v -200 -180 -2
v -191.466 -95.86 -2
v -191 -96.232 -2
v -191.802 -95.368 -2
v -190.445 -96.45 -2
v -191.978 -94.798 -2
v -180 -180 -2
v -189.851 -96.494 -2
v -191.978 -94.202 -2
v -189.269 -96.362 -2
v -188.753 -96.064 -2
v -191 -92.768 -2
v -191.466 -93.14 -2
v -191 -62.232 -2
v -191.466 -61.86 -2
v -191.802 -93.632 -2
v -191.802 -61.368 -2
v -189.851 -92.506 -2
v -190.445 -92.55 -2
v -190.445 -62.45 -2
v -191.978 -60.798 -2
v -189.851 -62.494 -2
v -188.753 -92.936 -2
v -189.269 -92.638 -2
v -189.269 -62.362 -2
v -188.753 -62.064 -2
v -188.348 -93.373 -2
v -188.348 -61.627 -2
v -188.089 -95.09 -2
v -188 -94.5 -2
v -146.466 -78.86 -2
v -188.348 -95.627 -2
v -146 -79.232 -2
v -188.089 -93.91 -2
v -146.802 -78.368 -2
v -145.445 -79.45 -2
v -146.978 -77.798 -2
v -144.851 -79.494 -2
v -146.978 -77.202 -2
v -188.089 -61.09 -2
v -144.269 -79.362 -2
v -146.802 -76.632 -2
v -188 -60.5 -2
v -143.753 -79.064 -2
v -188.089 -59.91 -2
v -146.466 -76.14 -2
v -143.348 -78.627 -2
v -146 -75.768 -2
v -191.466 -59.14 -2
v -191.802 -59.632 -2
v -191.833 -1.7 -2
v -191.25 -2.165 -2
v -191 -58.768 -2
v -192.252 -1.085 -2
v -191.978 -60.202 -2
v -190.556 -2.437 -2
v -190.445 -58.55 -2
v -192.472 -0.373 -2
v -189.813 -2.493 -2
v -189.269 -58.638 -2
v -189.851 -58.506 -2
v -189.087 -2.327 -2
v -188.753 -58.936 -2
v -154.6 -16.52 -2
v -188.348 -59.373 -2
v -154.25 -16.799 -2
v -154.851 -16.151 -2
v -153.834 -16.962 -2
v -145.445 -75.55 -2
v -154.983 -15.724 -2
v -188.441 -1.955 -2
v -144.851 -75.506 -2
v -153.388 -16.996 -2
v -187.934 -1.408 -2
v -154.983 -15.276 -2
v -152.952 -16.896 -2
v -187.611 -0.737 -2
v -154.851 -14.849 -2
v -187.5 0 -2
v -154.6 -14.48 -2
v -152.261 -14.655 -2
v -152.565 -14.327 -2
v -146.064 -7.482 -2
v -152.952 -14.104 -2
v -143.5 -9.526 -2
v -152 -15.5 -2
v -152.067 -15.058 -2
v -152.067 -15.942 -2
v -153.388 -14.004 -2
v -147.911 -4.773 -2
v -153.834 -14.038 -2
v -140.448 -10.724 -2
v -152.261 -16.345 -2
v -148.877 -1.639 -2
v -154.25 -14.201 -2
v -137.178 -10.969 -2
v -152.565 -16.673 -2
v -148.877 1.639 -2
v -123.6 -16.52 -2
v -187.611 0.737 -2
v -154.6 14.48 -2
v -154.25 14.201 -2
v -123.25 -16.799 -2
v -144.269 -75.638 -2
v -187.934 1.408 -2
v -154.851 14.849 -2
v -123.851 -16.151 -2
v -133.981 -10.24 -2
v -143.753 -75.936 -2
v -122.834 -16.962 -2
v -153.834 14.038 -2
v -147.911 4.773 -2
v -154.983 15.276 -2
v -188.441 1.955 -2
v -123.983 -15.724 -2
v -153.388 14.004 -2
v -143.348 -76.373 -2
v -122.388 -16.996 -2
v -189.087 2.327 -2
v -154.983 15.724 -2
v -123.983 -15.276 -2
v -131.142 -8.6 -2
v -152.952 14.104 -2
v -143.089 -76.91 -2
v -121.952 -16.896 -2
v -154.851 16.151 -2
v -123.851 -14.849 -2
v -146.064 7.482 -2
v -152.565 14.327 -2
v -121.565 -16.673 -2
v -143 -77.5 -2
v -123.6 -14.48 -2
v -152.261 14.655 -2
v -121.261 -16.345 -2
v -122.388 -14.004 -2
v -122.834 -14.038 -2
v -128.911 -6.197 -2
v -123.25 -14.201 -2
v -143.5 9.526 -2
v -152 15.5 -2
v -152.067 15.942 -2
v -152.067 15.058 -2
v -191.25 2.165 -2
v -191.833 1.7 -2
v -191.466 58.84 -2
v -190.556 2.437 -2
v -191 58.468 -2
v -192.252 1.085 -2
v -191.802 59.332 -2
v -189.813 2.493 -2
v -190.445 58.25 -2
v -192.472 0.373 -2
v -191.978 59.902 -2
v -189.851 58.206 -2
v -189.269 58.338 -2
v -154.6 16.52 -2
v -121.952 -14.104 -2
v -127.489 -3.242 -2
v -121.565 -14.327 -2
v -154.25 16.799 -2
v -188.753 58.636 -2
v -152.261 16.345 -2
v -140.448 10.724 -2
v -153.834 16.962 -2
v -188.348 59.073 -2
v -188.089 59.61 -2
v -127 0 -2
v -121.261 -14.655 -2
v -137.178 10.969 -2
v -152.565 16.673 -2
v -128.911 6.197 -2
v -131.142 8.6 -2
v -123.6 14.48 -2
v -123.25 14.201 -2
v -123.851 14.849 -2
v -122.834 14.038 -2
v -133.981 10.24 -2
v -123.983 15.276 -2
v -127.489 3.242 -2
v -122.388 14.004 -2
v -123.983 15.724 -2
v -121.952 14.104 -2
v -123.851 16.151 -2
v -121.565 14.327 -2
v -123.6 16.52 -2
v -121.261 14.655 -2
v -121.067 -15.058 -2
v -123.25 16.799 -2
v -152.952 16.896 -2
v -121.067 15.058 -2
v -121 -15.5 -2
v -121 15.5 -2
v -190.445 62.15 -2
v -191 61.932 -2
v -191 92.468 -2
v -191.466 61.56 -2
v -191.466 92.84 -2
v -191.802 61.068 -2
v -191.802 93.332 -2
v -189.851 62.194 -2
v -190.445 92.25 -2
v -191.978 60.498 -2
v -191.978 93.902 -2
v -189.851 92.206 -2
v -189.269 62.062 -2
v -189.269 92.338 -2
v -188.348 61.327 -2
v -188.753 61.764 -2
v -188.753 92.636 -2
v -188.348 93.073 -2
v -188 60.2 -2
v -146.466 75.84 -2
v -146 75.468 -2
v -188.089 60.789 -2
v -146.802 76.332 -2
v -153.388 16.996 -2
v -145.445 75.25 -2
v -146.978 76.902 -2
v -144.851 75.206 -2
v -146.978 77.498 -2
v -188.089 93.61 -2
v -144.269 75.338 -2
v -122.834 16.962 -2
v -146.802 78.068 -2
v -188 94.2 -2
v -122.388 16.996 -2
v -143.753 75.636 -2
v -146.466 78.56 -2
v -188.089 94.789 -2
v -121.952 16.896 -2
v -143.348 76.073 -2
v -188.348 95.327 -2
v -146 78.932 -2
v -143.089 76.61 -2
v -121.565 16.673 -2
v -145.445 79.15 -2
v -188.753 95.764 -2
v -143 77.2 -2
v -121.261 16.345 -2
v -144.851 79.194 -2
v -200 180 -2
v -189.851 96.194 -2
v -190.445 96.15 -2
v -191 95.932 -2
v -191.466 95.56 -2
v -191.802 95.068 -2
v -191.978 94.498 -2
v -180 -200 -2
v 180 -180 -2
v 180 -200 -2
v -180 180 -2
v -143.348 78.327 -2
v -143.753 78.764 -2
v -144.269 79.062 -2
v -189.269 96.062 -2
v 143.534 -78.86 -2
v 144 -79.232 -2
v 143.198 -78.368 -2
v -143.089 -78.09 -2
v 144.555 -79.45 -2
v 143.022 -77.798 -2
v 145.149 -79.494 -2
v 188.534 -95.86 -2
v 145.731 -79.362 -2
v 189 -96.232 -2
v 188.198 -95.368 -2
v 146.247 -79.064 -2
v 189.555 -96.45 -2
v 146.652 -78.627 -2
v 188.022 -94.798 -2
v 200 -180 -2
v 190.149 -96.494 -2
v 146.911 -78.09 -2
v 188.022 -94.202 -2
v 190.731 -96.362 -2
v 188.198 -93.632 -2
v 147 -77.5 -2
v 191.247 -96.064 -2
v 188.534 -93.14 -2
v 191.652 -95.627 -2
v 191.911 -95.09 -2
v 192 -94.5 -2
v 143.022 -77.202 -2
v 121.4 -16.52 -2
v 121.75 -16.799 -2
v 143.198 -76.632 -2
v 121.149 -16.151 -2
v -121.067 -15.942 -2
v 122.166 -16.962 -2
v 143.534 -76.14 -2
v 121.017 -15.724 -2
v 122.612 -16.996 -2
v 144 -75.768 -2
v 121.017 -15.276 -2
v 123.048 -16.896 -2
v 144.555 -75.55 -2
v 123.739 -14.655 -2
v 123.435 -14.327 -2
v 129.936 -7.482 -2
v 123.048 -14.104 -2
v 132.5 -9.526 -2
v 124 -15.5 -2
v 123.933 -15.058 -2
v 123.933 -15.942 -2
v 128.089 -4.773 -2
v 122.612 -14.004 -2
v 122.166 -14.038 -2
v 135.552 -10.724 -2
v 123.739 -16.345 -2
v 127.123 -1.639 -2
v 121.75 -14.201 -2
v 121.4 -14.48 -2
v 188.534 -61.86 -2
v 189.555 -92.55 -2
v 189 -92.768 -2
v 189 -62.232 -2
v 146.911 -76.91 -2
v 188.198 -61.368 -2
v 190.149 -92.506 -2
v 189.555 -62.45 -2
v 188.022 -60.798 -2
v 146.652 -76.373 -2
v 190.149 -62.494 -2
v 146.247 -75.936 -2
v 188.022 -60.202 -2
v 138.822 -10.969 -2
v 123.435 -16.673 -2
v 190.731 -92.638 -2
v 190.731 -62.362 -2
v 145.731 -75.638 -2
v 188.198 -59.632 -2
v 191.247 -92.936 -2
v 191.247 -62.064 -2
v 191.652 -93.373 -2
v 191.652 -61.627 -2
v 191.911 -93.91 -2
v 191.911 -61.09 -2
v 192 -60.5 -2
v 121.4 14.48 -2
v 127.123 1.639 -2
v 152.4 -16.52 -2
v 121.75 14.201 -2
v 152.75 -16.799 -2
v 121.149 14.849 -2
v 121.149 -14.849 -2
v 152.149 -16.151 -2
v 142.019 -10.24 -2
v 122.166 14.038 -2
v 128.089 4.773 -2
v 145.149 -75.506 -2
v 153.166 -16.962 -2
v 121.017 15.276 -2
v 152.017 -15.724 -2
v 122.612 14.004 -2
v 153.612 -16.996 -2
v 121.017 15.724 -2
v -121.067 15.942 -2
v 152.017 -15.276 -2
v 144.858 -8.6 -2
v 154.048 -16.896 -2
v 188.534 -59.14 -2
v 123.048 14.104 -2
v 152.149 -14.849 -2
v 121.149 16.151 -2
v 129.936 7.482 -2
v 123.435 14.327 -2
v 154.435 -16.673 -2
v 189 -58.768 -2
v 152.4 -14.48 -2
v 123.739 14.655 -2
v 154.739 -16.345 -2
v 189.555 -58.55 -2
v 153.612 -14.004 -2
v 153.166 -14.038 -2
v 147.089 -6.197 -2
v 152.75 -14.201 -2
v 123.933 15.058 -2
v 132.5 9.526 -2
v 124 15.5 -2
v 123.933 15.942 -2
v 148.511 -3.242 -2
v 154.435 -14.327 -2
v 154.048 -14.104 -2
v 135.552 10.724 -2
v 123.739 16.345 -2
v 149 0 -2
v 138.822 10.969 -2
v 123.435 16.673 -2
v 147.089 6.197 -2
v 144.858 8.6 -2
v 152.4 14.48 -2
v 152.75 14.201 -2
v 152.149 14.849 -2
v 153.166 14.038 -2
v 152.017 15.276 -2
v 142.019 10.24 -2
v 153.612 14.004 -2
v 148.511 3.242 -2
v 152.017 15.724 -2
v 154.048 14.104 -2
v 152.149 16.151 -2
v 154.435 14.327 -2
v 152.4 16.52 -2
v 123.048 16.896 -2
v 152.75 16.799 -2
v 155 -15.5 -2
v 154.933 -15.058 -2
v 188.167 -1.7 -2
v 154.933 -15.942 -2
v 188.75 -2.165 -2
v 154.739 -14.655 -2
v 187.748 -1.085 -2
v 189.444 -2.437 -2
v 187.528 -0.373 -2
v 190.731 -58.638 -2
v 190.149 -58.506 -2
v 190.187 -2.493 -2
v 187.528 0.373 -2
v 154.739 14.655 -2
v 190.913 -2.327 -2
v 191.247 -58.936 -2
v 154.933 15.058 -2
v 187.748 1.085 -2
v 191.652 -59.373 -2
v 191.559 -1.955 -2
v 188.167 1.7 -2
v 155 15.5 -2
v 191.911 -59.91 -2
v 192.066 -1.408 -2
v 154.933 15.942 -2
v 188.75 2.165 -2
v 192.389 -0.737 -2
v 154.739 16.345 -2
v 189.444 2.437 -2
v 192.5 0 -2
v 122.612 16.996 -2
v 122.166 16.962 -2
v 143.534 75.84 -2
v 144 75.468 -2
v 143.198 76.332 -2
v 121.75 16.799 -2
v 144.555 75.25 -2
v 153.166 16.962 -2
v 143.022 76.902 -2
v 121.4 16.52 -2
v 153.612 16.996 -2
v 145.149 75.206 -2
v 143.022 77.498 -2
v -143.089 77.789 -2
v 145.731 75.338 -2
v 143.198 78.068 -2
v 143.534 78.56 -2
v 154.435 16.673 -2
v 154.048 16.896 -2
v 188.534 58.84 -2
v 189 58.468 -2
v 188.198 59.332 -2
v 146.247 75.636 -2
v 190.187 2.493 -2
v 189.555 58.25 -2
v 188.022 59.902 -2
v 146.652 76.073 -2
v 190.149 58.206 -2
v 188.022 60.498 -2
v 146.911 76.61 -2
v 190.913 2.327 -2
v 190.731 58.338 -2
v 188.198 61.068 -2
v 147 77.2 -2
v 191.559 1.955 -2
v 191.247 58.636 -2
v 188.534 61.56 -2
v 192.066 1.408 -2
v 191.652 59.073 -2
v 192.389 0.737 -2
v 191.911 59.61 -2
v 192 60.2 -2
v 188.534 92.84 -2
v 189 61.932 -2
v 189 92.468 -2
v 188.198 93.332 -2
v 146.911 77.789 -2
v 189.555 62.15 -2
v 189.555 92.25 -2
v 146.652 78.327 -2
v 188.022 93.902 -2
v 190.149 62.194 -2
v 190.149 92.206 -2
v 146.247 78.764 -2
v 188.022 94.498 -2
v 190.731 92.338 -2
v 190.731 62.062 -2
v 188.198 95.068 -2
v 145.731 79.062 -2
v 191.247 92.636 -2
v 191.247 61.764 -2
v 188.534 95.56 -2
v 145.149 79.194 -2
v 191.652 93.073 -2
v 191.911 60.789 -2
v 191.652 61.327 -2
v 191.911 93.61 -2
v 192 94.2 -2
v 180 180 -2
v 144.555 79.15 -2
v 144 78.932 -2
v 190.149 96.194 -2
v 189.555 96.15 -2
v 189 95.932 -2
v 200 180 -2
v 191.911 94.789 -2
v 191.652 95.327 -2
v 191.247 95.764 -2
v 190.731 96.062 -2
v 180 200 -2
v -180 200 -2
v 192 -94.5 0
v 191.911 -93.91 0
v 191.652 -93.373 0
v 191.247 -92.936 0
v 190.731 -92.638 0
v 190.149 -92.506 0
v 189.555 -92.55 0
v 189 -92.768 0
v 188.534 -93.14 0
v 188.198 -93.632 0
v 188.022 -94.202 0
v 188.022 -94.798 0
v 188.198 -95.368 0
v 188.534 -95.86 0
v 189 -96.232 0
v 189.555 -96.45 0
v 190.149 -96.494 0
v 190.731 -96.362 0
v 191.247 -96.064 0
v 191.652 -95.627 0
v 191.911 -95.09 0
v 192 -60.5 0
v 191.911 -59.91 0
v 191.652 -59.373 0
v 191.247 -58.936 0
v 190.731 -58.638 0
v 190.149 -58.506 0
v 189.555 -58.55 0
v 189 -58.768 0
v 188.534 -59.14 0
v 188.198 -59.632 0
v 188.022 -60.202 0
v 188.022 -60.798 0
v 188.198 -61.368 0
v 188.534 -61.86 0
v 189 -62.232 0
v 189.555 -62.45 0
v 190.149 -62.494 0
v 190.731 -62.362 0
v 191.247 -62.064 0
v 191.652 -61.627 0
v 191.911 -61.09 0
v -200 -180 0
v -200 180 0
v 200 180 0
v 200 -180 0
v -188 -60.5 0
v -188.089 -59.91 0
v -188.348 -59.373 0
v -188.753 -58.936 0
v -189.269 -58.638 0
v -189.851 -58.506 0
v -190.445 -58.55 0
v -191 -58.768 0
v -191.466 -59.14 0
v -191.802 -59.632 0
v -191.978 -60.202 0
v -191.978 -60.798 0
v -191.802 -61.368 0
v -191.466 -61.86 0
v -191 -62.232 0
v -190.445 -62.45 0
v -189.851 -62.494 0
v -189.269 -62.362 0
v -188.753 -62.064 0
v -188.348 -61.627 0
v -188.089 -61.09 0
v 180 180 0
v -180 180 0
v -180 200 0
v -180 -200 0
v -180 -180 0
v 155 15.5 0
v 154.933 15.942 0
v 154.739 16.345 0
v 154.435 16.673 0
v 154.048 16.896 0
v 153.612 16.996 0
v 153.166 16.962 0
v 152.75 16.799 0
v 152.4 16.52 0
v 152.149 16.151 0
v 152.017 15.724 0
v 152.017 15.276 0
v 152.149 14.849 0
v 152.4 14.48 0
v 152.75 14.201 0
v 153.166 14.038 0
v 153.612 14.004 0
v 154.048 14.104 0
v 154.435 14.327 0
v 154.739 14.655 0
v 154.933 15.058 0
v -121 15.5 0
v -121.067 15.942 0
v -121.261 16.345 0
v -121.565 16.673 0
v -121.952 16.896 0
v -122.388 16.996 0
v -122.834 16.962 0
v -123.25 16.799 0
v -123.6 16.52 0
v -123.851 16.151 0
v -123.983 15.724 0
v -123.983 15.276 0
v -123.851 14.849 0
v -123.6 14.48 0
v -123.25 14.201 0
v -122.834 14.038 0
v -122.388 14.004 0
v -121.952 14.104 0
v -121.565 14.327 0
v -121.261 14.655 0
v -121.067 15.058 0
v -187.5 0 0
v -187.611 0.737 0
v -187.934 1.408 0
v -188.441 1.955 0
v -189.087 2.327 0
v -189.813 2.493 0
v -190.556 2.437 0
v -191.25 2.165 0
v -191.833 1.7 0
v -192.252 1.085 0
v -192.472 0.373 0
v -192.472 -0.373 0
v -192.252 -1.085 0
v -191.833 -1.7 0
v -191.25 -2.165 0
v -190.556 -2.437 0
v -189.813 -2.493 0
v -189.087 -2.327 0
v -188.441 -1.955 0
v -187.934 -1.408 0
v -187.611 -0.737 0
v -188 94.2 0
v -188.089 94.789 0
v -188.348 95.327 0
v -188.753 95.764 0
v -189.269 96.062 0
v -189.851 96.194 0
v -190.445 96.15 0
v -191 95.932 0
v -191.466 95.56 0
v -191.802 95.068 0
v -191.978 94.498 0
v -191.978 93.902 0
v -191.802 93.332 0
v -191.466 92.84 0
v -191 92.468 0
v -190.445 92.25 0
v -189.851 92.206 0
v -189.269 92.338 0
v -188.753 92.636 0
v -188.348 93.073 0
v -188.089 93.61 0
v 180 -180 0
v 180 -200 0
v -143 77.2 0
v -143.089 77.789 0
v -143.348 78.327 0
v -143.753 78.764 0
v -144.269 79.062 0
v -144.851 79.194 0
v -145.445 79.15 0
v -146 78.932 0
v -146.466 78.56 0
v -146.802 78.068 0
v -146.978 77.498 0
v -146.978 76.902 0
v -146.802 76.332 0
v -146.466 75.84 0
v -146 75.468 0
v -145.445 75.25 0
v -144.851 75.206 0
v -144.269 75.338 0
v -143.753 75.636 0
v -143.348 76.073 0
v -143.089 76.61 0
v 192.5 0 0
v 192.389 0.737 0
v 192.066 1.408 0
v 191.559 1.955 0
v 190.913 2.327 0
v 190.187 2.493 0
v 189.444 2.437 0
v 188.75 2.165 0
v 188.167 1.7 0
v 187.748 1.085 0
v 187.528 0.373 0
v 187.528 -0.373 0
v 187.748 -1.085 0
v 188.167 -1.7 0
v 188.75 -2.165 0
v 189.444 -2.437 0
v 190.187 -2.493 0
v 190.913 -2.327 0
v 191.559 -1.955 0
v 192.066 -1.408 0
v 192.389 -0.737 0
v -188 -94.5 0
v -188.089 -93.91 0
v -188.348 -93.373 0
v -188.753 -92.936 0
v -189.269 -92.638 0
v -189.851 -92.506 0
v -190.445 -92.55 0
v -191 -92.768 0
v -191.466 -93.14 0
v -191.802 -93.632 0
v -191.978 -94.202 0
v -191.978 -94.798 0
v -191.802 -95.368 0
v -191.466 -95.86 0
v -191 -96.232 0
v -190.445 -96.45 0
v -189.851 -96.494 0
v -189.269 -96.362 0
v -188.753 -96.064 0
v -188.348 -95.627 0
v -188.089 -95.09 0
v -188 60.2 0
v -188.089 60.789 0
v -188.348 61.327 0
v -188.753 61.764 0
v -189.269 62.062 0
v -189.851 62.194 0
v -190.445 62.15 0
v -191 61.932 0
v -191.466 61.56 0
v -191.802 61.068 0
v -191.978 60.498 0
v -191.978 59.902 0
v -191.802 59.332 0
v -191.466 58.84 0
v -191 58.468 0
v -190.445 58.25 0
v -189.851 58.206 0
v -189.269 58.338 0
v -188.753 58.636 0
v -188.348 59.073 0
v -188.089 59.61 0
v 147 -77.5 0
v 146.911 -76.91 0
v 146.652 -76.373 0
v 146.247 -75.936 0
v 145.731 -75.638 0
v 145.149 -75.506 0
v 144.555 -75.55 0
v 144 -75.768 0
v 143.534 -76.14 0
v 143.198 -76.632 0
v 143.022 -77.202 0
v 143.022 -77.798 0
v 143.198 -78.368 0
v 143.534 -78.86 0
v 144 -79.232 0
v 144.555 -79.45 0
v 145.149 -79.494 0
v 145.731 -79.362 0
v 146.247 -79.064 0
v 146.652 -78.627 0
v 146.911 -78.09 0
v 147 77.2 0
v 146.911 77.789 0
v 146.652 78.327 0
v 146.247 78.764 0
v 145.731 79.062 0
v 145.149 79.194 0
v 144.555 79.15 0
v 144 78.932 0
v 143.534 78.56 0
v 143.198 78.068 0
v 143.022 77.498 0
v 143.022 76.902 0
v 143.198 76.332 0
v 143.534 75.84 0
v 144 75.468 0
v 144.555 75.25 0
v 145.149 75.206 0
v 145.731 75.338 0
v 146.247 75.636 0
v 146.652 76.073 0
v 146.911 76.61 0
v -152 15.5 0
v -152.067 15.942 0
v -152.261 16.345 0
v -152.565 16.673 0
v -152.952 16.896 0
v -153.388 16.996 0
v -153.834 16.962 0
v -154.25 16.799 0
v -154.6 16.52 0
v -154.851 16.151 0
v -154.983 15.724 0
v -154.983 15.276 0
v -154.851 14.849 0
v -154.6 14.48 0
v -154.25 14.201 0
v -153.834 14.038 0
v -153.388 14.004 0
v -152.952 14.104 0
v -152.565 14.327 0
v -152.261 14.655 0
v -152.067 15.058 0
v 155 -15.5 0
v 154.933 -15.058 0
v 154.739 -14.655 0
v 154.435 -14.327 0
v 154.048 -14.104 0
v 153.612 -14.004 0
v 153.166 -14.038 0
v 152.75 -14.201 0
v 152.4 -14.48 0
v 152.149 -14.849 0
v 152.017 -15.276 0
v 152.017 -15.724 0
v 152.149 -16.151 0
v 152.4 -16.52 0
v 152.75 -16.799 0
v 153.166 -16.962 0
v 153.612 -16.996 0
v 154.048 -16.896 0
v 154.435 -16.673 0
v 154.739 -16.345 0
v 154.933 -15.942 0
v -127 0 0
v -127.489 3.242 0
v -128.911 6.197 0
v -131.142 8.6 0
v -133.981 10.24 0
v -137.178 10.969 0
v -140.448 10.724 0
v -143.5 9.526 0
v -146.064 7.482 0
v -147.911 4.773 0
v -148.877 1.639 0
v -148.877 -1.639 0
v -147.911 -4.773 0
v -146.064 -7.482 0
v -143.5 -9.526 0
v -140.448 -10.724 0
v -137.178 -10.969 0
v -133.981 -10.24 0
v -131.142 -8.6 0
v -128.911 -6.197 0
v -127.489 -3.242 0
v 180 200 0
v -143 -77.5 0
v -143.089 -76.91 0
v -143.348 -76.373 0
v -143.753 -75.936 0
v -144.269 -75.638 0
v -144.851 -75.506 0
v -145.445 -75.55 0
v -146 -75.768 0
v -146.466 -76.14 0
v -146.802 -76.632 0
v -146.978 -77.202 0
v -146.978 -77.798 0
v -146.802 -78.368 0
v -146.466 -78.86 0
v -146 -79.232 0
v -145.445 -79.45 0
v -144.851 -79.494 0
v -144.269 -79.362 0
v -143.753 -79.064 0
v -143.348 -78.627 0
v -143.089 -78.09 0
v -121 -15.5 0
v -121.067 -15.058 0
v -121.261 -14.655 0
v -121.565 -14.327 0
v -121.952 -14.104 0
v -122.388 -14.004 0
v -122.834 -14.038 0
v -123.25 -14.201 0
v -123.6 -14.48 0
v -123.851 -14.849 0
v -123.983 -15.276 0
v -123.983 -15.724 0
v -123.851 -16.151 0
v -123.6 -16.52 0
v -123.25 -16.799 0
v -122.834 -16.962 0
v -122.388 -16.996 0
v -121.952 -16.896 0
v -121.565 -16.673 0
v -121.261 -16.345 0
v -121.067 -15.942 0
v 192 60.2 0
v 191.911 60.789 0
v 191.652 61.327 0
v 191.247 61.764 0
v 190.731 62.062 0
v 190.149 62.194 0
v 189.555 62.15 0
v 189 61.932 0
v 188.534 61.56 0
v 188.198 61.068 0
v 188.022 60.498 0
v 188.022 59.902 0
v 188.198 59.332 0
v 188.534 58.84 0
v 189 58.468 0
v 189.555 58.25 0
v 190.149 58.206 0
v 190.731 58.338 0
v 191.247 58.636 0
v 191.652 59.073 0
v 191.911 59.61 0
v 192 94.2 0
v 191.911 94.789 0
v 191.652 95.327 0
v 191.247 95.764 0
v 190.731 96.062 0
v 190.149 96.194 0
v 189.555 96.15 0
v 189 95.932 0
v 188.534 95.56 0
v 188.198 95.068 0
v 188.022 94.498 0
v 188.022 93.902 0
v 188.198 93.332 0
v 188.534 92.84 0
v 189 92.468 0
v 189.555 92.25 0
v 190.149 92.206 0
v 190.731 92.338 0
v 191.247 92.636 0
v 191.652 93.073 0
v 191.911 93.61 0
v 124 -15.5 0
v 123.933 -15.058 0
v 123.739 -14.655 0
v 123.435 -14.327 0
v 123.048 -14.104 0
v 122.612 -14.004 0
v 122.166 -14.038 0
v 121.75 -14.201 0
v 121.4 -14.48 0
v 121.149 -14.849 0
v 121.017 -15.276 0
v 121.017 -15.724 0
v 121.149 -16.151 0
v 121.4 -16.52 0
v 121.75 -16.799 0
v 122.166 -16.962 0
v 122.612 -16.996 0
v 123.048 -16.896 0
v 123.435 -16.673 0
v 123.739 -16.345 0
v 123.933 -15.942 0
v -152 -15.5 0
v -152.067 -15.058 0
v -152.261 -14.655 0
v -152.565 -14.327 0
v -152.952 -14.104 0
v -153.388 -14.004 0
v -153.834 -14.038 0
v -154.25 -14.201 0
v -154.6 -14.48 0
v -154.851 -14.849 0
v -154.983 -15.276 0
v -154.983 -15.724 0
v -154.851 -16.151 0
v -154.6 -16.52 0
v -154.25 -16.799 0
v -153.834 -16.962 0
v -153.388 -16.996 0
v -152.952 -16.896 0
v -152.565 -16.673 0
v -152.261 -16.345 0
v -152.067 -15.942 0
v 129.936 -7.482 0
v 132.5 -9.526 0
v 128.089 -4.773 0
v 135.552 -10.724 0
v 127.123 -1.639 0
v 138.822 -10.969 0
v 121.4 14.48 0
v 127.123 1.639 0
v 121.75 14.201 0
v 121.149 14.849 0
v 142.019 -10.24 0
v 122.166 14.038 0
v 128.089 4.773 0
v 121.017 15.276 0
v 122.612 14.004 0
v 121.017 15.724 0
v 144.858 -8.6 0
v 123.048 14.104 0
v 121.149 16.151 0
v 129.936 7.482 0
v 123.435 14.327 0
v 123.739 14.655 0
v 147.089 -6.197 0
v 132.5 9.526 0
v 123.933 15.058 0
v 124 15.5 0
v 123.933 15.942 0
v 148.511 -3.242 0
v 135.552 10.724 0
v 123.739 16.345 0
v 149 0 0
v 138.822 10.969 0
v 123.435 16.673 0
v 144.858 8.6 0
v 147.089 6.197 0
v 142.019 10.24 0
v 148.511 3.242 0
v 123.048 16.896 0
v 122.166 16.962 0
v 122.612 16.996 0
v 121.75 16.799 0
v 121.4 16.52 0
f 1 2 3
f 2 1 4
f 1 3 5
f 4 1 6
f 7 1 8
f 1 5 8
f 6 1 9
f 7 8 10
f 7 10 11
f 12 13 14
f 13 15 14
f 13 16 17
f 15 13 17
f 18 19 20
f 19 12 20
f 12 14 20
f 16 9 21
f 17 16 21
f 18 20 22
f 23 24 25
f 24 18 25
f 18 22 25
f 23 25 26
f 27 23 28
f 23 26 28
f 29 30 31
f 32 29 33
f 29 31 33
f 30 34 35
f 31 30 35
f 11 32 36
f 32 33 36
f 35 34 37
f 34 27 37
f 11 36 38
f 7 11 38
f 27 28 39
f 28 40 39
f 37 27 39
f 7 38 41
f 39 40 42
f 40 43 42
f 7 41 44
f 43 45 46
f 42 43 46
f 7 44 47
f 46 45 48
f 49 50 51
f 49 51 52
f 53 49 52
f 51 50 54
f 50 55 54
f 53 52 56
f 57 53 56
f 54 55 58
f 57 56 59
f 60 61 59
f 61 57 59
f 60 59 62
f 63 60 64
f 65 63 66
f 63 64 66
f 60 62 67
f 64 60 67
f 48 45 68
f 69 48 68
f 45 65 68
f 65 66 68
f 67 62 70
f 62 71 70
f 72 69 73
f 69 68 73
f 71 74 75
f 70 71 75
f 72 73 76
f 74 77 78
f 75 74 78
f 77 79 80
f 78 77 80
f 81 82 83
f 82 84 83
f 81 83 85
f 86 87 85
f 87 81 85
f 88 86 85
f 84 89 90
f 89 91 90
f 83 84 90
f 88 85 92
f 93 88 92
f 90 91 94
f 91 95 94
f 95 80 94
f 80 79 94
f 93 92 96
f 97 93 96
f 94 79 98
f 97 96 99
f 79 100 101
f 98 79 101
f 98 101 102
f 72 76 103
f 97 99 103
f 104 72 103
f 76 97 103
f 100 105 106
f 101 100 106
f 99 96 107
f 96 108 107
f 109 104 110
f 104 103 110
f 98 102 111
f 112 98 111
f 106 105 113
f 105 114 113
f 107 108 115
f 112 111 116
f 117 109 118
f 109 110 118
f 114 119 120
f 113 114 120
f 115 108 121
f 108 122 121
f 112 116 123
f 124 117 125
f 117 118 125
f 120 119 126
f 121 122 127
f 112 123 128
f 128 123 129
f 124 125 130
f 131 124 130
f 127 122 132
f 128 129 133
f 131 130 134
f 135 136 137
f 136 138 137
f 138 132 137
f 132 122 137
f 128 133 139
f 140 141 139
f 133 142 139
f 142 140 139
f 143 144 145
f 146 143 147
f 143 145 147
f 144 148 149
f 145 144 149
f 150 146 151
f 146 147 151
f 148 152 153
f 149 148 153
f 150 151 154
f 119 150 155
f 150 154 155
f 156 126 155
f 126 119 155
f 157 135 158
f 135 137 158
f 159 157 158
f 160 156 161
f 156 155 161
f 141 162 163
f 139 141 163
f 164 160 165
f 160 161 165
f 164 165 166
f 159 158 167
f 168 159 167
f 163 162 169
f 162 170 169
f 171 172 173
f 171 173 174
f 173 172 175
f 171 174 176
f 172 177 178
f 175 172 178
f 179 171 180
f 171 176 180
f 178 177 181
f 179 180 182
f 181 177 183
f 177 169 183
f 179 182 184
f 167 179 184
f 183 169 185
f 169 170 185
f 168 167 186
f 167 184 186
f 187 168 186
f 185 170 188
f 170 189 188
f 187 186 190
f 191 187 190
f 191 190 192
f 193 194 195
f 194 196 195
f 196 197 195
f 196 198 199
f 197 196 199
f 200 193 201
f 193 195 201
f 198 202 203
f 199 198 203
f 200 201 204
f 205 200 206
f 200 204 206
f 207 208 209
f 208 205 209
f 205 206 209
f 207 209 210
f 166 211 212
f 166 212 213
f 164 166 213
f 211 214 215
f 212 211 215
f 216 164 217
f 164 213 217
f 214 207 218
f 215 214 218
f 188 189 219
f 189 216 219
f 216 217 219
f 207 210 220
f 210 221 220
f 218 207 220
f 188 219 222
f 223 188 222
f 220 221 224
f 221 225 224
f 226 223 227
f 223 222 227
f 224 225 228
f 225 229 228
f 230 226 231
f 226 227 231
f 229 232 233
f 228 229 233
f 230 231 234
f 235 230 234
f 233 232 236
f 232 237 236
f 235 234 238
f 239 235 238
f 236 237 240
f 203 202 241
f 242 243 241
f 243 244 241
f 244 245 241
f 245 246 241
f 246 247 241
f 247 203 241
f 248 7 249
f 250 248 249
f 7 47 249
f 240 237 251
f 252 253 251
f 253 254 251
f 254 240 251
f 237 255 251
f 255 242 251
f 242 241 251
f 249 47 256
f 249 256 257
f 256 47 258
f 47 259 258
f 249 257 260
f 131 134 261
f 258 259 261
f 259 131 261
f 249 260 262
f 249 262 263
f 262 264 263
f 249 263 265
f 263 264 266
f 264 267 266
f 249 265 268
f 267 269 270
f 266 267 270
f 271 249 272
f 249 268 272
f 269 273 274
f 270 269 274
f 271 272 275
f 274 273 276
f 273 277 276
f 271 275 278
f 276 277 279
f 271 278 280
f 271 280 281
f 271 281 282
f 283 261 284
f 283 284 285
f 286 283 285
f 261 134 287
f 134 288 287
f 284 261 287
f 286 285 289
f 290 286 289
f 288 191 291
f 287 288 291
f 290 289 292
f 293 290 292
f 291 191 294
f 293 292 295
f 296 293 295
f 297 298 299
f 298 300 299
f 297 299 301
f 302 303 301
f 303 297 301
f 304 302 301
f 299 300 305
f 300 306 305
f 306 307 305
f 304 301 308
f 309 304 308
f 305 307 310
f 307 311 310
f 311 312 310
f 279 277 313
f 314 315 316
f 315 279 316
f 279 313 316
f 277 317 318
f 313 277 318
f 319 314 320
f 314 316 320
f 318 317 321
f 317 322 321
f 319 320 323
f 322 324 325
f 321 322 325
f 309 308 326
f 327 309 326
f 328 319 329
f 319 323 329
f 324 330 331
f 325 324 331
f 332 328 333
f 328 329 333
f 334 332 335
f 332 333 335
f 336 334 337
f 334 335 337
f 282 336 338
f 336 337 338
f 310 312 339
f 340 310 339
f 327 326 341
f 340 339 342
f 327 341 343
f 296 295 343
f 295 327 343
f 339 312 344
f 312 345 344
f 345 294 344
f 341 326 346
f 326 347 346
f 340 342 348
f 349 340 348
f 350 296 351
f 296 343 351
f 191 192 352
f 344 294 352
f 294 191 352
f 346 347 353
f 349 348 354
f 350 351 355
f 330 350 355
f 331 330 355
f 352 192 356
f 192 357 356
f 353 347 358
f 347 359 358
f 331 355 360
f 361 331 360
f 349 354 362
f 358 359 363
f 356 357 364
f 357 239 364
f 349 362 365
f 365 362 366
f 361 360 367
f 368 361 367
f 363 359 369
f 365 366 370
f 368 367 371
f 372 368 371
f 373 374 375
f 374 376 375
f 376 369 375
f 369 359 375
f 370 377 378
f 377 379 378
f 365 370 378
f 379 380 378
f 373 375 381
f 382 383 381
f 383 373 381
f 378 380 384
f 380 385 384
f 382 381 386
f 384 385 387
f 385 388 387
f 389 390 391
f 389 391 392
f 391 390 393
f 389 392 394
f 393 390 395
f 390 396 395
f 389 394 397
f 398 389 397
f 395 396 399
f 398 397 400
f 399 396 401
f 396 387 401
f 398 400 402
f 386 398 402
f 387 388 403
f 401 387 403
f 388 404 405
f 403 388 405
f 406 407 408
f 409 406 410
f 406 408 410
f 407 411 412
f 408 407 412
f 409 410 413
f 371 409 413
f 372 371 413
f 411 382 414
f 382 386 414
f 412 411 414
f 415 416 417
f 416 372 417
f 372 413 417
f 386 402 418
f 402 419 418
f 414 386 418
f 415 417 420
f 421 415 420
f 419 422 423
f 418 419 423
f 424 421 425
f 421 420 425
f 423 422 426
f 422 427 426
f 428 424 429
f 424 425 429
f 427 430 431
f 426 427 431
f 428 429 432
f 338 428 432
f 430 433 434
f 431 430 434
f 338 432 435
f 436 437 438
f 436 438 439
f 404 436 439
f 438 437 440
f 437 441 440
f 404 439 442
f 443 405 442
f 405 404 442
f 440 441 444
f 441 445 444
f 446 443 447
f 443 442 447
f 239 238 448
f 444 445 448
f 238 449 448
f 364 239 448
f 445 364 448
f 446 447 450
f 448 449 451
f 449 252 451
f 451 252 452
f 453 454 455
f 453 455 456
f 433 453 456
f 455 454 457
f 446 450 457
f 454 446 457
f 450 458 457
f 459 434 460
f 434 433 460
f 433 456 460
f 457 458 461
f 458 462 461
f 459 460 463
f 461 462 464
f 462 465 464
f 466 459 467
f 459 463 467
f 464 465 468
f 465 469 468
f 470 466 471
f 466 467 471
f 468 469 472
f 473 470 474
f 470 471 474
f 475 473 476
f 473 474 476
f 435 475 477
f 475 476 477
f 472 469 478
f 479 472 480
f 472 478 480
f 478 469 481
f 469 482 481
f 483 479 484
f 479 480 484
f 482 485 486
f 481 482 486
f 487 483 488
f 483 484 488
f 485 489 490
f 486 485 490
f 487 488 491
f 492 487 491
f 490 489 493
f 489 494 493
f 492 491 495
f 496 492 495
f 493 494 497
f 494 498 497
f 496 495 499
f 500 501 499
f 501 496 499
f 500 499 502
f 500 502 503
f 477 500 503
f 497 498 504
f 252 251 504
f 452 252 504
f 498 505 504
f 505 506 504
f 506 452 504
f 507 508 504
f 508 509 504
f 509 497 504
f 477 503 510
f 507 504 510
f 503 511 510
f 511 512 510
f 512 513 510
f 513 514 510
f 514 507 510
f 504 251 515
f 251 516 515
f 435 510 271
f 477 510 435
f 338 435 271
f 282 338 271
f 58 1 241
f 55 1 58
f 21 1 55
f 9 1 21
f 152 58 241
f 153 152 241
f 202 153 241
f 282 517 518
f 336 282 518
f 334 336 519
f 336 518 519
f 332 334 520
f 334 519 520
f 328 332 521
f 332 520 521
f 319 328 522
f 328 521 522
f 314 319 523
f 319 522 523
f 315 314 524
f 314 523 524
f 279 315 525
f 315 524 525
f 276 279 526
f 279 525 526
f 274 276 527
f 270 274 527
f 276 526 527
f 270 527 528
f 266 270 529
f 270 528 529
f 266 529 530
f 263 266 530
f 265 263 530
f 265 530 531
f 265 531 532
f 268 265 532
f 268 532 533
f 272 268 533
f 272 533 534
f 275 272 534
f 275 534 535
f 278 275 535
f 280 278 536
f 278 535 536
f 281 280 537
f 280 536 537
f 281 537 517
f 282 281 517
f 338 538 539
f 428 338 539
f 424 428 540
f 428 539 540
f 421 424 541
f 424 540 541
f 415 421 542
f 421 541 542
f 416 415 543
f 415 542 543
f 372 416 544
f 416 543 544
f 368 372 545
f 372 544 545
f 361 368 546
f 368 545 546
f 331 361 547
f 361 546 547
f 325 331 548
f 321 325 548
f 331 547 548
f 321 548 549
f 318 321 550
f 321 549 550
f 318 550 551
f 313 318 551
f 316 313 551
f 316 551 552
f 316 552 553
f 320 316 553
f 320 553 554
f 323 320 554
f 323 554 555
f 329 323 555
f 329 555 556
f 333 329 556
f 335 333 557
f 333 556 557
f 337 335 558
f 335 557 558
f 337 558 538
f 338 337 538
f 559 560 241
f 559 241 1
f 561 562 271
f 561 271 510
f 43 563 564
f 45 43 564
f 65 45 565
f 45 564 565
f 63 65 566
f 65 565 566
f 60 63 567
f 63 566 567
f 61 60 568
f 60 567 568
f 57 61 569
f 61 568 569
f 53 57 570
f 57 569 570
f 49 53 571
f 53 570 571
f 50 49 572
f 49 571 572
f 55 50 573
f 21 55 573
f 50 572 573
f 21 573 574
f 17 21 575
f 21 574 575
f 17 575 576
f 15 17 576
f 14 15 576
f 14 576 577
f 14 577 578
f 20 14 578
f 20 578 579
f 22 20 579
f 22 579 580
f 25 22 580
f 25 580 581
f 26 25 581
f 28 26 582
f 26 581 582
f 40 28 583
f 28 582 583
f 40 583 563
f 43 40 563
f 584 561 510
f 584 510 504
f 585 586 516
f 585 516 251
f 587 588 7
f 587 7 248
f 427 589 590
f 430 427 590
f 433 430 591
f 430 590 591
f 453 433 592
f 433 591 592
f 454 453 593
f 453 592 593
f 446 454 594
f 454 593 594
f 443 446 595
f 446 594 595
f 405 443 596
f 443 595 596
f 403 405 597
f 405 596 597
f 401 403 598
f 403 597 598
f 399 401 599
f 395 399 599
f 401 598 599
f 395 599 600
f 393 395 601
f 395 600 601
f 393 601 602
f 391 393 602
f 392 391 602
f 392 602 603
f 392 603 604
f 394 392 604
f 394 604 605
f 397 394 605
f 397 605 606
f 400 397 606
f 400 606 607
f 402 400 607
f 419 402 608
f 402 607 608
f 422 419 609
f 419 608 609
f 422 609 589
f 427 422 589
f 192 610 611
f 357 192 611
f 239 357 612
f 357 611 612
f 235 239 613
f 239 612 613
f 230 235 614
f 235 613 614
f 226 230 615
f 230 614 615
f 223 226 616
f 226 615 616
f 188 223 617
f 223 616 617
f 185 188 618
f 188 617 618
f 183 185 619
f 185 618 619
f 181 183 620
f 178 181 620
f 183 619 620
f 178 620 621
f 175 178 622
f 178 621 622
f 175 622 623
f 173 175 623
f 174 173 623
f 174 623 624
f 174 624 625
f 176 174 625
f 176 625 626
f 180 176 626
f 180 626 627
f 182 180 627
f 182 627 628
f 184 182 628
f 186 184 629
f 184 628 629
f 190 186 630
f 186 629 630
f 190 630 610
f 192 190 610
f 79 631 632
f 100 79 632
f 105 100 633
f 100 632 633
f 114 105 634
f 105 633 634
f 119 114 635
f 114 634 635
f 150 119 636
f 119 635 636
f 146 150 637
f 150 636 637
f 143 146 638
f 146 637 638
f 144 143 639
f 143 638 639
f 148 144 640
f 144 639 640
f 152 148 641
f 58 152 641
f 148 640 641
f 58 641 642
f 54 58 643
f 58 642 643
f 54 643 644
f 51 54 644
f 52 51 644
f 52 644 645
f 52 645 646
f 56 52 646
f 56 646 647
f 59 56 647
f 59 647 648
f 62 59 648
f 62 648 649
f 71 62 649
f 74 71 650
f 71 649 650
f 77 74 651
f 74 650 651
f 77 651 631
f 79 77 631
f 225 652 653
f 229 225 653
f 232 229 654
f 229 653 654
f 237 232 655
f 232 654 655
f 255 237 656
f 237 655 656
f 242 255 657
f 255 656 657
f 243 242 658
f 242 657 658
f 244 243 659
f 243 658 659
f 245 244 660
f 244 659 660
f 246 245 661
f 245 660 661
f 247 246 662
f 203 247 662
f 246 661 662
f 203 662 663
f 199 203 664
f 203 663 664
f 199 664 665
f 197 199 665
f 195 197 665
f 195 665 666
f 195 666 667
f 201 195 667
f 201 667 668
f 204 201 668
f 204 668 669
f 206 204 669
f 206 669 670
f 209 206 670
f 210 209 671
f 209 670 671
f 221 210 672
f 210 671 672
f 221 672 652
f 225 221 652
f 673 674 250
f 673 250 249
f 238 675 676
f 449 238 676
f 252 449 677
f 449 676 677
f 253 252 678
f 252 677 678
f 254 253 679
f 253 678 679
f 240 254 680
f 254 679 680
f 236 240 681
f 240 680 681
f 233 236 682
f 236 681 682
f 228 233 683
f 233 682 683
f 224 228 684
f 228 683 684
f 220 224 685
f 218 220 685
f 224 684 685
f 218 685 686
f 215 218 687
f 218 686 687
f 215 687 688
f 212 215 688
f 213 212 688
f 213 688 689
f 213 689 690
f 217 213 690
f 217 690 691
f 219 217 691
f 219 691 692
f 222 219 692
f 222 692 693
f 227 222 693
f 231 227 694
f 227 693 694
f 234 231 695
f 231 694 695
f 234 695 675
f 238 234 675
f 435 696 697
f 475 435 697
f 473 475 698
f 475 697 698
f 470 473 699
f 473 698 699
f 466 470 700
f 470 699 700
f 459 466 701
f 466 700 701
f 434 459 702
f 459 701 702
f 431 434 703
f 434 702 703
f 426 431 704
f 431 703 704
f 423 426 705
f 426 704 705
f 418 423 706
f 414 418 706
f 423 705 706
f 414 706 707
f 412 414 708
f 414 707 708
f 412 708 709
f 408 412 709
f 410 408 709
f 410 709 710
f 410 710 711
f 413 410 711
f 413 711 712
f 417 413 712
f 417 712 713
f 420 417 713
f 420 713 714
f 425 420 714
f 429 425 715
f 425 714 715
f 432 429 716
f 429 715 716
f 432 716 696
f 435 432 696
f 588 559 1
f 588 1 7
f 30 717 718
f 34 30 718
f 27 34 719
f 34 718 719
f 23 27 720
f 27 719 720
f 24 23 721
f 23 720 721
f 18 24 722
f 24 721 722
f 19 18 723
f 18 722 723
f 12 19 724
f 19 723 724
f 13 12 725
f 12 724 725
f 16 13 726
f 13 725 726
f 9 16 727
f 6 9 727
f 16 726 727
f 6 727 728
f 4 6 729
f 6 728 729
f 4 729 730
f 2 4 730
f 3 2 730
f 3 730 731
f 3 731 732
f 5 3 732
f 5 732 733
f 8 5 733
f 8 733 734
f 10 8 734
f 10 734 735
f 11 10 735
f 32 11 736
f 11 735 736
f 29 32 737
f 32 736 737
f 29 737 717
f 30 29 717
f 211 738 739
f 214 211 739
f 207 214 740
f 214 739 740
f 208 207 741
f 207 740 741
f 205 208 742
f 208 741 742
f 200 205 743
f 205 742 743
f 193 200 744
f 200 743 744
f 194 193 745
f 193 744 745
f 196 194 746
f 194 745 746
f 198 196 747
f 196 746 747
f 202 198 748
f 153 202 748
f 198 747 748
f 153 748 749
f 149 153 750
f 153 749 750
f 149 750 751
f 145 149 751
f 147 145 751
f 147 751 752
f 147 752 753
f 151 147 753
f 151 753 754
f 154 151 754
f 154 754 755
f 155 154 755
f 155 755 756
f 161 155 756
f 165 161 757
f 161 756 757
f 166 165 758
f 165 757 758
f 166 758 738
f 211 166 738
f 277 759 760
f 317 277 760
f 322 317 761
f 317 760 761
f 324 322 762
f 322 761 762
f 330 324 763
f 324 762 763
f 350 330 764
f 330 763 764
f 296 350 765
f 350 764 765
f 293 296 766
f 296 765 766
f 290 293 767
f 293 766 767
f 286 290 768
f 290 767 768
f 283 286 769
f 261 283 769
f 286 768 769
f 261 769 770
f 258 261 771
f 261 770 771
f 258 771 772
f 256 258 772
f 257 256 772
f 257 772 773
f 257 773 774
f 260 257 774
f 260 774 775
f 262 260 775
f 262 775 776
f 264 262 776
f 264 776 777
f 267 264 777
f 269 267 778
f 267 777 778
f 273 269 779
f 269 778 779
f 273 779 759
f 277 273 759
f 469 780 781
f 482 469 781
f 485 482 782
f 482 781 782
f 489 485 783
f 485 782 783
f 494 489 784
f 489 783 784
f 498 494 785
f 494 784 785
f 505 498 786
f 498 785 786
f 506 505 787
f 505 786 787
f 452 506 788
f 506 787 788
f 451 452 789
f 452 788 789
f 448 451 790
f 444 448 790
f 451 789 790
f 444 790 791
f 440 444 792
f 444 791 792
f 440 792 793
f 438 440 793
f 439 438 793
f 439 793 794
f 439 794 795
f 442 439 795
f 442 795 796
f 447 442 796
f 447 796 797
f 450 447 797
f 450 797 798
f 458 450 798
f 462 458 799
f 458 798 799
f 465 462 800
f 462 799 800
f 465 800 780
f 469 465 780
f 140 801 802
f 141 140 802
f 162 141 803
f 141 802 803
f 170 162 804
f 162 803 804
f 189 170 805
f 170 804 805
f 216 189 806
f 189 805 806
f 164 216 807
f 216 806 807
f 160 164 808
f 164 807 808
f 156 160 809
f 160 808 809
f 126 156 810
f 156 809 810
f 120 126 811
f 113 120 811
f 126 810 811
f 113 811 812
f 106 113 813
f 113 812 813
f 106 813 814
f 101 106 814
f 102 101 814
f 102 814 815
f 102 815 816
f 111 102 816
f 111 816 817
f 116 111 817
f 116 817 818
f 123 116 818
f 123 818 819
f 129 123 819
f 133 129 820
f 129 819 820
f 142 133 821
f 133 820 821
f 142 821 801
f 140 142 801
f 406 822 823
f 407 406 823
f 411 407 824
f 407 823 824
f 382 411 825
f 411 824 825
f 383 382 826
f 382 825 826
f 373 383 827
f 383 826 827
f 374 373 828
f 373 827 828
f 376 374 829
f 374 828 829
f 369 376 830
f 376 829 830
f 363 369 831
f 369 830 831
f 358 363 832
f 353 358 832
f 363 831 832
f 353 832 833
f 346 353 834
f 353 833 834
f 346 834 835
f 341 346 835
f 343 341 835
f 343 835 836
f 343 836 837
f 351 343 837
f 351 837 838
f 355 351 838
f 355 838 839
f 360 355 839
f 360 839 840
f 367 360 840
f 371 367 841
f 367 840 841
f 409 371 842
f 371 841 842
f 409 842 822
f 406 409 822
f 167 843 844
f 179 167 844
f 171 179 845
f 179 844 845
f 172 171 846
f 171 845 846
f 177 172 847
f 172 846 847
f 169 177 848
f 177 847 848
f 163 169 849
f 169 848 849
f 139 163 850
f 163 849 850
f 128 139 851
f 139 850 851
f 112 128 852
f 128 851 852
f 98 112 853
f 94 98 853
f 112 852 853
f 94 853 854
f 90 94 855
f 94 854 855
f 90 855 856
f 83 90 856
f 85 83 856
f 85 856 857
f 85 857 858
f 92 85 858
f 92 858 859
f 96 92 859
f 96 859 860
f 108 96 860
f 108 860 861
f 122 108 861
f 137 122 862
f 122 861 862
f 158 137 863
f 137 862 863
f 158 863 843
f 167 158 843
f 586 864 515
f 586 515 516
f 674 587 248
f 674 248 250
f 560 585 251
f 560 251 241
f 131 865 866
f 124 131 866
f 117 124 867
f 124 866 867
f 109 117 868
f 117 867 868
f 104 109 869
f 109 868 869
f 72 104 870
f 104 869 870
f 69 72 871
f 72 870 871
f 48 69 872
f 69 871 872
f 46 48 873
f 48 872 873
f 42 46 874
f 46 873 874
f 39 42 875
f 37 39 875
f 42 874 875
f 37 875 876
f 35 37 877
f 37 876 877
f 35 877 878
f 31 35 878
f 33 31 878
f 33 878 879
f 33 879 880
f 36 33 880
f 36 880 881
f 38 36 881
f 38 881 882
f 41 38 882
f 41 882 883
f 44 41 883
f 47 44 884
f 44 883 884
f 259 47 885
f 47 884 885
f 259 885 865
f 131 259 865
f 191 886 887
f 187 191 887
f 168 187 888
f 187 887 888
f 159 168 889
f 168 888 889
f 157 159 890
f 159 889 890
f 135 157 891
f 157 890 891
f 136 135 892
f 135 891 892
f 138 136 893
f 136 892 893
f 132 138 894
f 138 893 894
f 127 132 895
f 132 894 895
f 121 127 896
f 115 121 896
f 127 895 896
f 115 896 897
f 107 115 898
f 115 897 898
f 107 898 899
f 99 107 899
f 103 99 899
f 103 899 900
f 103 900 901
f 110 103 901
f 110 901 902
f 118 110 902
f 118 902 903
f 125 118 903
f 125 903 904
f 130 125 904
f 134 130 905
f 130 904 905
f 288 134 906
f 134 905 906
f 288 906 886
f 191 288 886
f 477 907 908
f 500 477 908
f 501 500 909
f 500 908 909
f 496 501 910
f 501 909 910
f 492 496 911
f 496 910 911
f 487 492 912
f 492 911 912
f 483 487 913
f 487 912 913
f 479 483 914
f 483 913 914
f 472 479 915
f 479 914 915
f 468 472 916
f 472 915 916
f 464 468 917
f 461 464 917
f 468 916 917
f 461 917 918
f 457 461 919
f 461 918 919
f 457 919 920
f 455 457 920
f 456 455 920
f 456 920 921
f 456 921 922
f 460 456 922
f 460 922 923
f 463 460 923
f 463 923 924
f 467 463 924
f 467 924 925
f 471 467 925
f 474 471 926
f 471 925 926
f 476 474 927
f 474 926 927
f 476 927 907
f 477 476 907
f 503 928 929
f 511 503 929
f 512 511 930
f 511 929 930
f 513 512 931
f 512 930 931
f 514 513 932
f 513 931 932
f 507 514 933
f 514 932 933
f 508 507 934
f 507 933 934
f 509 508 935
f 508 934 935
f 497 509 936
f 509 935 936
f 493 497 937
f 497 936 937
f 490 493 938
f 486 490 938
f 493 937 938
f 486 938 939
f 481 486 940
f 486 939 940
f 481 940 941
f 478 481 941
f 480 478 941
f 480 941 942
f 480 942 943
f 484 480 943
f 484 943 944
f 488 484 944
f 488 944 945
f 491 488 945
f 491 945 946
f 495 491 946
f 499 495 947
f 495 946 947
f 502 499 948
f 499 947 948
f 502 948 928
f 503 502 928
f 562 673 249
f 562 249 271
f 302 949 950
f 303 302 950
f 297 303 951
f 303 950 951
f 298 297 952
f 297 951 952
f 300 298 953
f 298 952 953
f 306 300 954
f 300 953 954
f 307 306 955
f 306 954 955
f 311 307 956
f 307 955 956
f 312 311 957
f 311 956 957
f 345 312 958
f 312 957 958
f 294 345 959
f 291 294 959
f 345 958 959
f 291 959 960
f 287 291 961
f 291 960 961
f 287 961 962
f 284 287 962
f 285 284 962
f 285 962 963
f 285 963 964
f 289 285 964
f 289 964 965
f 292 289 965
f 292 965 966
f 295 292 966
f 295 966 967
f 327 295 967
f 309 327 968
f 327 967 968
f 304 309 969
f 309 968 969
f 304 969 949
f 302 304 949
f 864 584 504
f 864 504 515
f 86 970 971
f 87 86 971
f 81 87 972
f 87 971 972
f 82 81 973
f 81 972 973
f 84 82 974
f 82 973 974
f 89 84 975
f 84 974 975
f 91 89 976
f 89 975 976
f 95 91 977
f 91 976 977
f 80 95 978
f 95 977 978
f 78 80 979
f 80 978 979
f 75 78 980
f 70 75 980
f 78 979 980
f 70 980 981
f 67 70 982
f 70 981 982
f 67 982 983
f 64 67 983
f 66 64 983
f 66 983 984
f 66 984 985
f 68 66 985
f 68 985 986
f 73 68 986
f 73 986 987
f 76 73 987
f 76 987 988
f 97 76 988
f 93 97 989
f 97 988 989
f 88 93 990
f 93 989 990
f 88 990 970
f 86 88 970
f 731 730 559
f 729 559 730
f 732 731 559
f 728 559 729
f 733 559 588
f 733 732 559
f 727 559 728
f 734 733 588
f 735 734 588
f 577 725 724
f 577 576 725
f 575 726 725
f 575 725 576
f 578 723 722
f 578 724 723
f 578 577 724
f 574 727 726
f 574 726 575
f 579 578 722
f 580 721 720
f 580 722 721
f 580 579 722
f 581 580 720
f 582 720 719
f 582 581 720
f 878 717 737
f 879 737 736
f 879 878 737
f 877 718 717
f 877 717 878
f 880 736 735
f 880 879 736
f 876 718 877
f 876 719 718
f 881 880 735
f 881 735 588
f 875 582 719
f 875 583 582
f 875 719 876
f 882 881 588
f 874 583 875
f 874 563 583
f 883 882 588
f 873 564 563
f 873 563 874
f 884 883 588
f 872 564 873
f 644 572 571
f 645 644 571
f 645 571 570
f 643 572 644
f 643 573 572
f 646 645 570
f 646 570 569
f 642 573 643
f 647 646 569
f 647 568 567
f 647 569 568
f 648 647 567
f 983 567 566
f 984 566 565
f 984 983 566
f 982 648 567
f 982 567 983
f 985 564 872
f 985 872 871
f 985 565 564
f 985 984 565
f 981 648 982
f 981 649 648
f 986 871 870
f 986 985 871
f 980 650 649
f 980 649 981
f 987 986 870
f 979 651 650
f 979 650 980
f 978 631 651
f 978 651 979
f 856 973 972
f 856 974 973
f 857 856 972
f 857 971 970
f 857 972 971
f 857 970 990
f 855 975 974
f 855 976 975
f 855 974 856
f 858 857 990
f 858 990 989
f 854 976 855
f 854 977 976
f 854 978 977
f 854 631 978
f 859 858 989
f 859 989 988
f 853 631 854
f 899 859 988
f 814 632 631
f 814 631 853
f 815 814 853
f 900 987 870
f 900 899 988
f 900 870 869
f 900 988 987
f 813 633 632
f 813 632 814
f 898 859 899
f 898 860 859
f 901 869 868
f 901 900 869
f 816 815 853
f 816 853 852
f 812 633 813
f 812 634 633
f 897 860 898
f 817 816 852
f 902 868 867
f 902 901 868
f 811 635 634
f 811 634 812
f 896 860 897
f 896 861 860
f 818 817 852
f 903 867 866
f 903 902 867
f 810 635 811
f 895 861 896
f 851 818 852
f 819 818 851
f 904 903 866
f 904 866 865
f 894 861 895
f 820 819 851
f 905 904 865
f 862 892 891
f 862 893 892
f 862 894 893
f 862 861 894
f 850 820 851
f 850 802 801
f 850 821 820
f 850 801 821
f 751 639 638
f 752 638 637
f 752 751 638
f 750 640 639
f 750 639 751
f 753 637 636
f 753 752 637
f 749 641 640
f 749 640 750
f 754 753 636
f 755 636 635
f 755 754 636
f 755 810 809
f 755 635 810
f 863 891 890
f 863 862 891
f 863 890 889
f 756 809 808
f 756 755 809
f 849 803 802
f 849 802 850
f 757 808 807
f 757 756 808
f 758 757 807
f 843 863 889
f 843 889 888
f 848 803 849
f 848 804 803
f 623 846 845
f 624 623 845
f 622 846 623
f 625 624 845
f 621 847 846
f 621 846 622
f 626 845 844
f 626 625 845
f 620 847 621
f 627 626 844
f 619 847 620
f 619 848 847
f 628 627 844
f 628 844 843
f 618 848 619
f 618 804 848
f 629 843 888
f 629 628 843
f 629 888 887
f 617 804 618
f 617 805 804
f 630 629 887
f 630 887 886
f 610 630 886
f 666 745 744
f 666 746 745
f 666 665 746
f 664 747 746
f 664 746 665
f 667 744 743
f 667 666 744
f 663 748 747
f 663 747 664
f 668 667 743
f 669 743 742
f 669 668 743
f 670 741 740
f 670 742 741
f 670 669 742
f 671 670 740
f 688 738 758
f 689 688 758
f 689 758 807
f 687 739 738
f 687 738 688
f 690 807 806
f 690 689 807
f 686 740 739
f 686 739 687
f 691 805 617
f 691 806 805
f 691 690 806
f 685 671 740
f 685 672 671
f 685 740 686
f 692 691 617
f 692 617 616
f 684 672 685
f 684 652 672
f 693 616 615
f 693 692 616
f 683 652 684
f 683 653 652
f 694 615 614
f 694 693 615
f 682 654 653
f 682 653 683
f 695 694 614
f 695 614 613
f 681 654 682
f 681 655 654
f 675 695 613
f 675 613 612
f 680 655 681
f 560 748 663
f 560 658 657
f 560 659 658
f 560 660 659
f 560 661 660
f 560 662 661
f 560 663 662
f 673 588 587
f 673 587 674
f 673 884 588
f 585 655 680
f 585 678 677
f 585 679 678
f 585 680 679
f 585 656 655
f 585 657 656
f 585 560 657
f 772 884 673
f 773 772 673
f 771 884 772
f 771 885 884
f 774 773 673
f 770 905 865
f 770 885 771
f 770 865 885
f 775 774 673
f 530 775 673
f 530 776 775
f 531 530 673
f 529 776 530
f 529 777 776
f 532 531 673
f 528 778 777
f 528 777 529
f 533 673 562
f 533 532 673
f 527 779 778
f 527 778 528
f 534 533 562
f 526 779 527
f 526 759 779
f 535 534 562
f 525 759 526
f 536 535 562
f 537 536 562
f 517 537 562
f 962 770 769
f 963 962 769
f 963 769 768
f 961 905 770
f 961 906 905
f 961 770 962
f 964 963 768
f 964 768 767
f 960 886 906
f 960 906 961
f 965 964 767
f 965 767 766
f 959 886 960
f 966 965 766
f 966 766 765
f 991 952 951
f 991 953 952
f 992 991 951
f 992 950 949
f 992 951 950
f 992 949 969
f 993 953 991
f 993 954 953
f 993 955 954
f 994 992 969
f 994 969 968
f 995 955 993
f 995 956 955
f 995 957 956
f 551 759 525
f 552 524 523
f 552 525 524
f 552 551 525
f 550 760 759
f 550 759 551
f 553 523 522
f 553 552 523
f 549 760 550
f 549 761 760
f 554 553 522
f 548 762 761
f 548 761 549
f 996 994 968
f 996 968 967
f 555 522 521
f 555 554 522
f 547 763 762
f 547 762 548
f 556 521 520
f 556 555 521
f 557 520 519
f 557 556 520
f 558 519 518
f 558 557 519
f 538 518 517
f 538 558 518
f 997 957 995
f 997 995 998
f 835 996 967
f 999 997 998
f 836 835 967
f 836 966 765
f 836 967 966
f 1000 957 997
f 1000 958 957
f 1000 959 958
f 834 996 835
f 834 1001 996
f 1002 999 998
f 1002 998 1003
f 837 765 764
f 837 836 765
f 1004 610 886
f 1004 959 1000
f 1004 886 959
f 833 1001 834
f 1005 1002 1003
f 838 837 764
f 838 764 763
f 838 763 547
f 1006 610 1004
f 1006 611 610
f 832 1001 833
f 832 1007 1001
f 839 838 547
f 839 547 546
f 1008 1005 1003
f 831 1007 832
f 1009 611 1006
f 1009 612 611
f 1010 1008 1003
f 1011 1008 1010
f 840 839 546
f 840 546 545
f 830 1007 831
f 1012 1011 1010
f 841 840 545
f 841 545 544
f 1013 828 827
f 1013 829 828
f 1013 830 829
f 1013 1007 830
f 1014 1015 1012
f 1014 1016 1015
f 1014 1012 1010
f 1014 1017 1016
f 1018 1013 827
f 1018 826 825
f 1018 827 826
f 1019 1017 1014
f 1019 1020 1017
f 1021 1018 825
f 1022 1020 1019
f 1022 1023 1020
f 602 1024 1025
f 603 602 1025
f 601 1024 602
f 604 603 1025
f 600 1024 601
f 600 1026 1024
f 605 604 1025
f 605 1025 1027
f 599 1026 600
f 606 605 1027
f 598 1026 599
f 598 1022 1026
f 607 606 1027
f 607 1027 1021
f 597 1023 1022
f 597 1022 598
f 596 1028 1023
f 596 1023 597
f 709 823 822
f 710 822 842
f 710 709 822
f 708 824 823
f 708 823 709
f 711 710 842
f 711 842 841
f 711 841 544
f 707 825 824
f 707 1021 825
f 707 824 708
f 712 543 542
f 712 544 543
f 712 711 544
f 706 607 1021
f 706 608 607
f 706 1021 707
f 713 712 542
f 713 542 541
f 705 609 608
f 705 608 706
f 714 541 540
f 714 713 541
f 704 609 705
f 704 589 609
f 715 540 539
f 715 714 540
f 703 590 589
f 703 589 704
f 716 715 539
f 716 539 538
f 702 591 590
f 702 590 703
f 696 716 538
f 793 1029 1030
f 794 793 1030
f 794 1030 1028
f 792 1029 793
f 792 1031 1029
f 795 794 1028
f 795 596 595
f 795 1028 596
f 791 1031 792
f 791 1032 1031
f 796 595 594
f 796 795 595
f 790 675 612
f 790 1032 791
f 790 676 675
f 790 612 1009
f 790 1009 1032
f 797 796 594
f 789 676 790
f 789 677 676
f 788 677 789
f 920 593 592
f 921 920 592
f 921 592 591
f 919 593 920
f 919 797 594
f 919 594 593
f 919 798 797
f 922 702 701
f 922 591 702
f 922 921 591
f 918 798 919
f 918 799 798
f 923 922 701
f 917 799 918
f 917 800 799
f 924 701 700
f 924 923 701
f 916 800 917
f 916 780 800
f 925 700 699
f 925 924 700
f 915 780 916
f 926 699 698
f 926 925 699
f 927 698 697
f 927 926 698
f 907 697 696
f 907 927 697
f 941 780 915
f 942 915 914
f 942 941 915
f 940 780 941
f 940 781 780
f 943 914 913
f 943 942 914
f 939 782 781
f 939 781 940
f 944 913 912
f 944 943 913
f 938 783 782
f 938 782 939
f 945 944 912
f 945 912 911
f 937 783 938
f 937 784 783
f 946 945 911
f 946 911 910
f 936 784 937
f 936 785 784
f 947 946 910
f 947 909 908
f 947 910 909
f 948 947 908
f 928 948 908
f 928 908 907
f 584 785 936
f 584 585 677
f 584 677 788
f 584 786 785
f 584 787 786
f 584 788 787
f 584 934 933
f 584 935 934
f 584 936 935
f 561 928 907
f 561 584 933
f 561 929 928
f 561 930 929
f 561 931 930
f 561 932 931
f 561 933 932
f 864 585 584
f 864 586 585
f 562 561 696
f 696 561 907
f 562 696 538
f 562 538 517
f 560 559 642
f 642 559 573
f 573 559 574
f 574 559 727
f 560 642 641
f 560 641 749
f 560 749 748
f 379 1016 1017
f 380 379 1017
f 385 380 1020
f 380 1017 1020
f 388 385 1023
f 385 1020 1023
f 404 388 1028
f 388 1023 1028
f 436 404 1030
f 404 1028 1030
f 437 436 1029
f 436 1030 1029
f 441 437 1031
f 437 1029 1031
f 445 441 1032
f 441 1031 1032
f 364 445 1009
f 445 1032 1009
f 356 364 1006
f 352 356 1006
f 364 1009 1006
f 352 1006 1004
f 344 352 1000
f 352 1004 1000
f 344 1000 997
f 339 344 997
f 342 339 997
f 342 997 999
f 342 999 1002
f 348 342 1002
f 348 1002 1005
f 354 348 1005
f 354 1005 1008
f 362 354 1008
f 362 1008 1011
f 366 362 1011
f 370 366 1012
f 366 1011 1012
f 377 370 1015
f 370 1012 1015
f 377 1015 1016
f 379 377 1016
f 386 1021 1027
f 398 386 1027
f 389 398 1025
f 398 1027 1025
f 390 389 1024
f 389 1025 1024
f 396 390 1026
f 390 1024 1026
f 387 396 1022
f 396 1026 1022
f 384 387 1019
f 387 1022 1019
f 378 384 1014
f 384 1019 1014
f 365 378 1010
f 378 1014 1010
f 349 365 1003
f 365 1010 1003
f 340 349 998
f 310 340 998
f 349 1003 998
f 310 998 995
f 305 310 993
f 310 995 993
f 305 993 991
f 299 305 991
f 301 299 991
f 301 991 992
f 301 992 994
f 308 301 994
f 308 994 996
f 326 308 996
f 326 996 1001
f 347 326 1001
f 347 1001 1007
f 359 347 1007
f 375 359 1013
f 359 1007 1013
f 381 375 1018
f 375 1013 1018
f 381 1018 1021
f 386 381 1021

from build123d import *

# Parameters (mm, degrees)
F0_R     = 2
F0_R_2   = 1.5
F0_R_3   = 2.5
F0_R_4   = 11
F1_DEPTH = 2


with BuildPart() as f1:
    # F0 (on Top) → F1 (new body)
    with BuildSketch(Plane.XY):
        Polygon((200, -180), (200, 180), (180, 180), (180, 200), (-180, 200), (-180, 180), (-200, 180), (-200, -180), (-180, -180), (-180, -200), (180, -200), (180, -180), align=None)
        with Locations((-190.000003, -94.5)):
            Circle(F0_R, mode=Mode.SUBTRACT)
        with Locations((-190.000003, -60.5)):
            Circle(F0_R, mode=Mode.SUBTRACT)
        with Locations((-145.000003, -77.5)):
            Circle(F0_R, mode=Mode.SUBTRACT)
        with Locations((-153.5, -15.5)):
            Circle(F0_R_2, mode=Mode.SUBTRACT)
        with Locations((-122.5, -15.5)):
            Circle(F0_R_2, mode=Mode.SUBTRACT)
        with Locations((145.000003, -77.5)):
            Circle(F0_R, mode=Mode.SUBTRACT)
        with Locations((190.000003, -94.5)):
            Circle(F0_R, mode=Mode.SUBTRACT)
        with Locations((190.000003, -60.5)):
            Circle(F0_R, mode=Mode.SUBTRACT)
        with Locations((122.5, -15.5)):
            Circle(F0_R_2, mode=Mode.SUBTRACT)
        with Locations((153.5, -15.5)):
            Circle(F0_R_2, mode=Mode.SUBTRACT)
        with Locations((-190, 0)):
            Circle(F0_R_3, mode=Mode.SUBTRACT)
        with Locations((-153.5, 15.5)):
            Circle(F0_R_2, mode=Mode.SUBTRACT)
        with Locations((-138, 0)):
            Circle(F0_R_4, mode=Mode.SUBTRACT)
        with Locations((-122.5, 15.5)):
            Circle(F0_R_2, mode=Mode.SUBTRACT)
        with Locations((-190, 60.199966)):
            Circle(F0_R, mode=Mode.SUBTRACT)
        with Locations((-190, 94.199966)):
            Circle(F0_R, mode=Mode.SUBTRACT)
        with Locations((-145, 77.199966)):
            Circle(F0_R, mode=Mode.SUBTRACT)
        with Locations((122.5, 15.5)):
            Circle(F0_R_2, mode=Mode.SUBTRACT)
        with Locations((138, 0)):
            Circle(F0_R_4, mode=Mode.SUBTRACT)
        with Locations((153.5, 15.5)):
            Circle(F0_R_2, mode=Mode.SUBTRACT)
        with Locations((190, 0)):
            Circle(F0_R_3, mode=Mode.SUBTRACT)
        with Locations((145, 77.199966)):
            Circle(F0_R, mode=Mode.SUBTRACT)
        with Locations((190, 60.199966)):
            Circle(F0_R, mode=Mode.SUBTRACT)
        with Locations((190, 94.199966)):
            Circle(F0_R, mode=Mode.SUBTRACT)
    extrude(amount=-F1_DEPTH)


solid = f1.part
